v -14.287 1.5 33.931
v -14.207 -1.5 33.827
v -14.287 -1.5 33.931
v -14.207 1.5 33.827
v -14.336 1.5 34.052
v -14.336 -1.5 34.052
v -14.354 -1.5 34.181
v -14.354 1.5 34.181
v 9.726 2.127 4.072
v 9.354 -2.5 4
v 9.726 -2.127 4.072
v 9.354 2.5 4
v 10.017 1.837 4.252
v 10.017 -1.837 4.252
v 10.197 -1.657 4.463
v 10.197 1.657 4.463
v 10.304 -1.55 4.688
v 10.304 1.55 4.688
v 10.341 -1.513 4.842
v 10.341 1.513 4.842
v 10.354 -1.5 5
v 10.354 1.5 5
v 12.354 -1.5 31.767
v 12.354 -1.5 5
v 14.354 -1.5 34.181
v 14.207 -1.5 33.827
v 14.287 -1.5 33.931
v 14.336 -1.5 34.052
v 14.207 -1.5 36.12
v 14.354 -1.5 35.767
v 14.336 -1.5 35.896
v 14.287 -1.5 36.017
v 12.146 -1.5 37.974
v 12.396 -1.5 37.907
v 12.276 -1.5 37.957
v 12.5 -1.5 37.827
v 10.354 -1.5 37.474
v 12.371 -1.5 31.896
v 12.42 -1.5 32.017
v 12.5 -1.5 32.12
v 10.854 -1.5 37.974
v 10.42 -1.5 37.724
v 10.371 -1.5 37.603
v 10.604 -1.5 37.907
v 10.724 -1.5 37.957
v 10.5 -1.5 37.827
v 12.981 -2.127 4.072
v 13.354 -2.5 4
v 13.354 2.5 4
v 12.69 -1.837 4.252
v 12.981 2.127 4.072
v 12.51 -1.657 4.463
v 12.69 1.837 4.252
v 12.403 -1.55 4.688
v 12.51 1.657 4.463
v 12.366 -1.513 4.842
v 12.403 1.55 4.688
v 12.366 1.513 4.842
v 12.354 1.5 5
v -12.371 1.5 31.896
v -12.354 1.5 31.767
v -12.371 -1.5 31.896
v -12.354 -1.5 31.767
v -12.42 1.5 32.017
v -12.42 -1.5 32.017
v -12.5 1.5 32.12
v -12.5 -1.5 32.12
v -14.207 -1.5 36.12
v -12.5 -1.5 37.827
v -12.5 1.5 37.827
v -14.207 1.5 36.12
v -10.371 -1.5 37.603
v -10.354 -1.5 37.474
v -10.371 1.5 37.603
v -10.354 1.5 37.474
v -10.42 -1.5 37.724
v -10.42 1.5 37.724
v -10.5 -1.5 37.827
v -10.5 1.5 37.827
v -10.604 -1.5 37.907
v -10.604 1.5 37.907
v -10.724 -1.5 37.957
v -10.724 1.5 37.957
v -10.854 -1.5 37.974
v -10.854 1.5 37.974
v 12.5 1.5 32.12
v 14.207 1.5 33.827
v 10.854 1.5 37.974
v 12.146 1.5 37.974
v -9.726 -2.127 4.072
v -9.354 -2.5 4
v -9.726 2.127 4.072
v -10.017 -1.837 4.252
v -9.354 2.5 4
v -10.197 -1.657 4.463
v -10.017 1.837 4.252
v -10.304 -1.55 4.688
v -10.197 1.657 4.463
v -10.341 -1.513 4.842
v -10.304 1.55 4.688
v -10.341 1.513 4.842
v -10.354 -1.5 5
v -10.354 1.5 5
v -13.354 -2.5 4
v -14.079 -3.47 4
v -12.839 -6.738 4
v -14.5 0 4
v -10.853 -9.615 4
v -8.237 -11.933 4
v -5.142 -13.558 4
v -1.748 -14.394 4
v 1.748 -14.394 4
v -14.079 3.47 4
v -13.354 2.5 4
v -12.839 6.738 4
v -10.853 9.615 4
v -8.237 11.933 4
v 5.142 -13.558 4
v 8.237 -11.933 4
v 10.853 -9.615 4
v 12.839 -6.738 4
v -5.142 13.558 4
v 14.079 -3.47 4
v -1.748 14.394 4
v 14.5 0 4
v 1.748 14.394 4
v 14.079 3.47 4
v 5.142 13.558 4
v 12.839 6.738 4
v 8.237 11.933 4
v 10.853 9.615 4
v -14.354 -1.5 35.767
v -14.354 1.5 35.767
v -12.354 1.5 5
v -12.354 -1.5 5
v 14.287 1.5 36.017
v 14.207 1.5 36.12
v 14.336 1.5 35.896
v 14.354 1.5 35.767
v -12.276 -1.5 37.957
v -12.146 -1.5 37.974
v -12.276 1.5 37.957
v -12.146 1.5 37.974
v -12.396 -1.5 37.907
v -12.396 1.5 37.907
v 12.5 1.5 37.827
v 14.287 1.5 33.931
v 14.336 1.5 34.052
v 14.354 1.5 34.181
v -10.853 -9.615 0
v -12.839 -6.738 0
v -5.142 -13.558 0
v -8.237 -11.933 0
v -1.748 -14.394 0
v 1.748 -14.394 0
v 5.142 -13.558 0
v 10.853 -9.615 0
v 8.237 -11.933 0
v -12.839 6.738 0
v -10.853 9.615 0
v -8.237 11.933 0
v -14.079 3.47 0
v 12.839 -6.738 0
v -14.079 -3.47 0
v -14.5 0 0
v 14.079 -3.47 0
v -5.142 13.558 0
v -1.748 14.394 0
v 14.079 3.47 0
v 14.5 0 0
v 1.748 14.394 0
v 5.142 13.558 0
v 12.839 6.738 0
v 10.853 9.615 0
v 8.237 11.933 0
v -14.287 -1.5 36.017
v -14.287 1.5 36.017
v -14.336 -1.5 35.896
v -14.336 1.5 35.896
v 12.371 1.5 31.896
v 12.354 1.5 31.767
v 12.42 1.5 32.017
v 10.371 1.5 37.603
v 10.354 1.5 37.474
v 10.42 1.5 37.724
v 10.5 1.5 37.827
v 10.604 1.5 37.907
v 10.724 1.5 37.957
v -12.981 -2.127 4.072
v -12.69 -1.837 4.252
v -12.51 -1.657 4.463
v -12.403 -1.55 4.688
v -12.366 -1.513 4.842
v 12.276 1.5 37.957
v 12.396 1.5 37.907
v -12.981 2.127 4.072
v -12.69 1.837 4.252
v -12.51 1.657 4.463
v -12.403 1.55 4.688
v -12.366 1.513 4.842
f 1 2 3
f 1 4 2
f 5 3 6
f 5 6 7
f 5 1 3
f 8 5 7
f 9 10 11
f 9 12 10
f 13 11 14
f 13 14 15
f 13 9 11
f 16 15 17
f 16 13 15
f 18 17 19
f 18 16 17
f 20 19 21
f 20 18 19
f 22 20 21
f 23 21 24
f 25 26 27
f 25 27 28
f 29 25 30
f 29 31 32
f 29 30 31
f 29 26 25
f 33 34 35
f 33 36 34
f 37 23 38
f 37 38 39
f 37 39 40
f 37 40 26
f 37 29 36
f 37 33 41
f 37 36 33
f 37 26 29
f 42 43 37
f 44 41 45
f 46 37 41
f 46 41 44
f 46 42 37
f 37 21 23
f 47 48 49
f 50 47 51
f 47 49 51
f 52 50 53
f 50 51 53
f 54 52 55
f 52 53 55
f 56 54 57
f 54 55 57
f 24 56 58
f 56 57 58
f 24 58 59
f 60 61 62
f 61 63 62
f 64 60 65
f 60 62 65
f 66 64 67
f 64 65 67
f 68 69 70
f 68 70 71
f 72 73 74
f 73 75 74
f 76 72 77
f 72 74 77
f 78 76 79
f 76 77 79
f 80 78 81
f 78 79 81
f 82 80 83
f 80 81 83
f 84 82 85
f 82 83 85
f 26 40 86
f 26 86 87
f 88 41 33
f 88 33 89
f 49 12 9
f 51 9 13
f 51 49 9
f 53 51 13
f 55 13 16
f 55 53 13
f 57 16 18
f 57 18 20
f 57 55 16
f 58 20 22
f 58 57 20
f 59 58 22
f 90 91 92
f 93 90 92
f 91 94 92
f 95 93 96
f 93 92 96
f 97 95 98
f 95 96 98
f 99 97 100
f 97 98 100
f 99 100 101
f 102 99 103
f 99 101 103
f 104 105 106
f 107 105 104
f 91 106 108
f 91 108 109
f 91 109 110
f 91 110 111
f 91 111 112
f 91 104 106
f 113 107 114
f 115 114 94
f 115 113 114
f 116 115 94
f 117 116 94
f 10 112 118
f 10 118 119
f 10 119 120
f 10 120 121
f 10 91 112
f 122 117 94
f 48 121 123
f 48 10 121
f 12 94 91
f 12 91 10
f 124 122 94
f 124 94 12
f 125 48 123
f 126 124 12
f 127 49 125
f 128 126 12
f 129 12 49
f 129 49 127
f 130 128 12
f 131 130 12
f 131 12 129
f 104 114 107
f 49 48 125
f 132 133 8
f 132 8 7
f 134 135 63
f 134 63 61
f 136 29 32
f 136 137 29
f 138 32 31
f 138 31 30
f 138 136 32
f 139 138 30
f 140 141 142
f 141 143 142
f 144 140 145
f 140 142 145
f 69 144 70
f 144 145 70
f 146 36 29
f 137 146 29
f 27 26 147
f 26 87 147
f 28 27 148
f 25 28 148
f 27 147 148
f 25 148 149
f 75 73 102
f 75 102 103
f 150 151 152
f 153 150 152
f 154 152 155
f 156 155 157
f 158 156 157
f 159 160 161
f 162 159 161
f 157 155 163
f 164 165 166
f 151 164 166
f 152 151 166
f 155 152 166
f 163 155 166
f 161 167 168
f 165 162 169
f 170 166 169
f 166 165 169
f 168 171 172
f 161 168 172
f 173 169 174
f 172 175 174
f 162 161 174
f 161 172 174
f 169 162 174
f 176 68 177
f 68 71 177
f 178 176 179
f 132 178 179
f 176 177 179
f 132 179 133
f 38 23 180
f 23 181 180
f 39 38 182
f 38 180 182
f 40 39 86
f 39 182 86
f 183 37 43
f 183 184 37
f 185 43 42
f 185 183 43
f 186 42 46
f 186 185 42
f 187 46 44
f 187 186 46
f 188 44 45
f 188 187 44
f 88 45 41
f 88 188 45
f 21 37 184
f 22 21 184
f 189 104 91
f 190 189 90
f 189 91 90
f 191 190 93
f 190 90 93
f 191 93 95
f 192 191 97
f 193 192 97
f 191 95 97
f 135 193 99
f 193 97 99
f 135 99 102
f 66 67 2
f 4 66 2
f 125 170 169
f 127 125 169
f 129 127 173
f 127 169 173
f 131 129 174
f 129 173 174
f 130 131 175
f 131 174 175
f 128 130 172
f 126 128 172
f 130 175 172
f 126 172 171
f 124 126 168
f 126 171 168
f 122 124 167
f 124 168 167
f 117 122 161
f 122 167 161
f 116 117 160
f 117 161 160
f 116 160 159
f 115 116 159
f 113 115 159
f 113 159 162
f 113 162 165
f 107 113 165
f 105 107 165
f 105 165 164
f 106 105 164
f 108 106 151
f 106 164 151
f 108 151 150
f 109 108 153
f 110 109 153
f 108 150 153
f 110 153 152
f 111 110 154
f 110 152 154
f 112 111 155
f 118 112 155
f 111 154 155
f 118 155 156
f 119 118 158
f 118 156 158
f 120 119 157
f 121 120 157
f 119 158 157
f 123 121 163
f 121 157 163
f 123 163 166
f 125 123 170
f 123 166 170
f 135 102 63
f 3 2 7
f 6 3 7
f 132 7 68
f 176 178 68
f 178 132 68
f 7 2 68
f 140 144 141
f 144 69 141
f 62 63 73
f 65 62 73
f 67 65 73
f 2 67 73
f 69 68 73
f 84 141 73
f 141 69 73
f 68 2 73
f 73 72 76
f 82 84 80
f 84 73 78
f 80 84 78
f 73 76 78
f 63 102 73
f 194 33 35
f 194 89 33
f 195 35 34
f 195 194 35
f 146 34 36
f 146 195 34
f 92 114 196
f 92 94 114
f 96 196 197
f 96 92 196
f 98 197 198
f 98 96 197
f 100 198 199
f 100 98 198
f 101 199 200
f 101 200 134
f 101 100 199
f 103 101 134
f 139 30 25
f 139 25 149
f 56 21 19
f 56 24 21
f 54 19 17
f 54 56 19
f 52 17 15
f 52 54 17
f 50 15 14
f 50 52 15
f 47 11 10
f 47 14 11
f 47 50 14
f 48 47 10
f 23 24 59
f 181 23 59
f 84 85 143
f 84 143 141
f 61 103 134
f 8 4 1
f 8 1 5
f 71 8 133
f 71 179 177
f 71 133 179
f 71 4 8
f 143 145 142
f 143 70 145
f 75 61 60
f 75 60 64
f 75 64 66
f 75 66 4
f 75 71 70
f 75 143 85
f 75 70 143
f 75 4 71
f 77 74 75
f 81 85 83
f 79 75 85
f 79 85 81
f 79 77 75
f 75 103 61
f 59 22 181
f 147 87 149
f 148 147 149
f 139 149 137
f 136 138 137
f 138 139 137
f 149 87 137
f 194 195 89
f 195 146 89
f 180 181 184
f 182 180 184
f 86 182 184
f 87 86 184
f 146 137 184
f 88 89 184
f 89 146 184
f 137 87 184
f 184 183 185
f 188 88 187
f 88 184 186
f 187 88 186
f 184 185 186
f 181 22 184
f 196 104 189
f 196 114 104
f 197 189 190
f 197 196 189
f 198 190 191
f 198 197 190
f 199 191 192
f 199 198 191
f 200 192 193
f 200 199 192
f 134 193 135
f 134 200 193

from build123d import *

# Parameters (mm, degrees)
SKETCH1_R           = 14.5
BOSS_EXTRUDE1_DEPTH = 4
SKETCH2_W           = 2
SKETCH2_H           = 3
BOSS_EXTRUDE2_DEPTH = 33.973847717
SKETCH3_W           = 3
SKETCH3_H           = 6
BOSS_EXTRUDE3_DEPTH = 2
CUT_EXTRUDE1_REACH  = 45.684
SKETCH5_W           = 3
SKETCH5_H           = 6
BOSS_EXTRUDE4_DEPTH = 2
CUT_EXTRUDE2_REACH  = 45.684
FILLET1_R           = 1
FILLET2_R           = 0.5


with BuildPart() as part:
    # Sketch1 → Boss-Extrude1 (new body)
    with BuildSketch(Plane(origin=(0, 0, 0), x_dir=(0, 1, 0), z_dir=(0, 0, 1))):
        with Locations(Location((0, 0, 0), (0, 0, 270))):
            Circle(SKETCH1_R)
    extrude(amount=BOSS_EXTRUDE1_DEPTH)

    # Sketch2 → Boss-Extrude2 (add)
    with BuildSketch(Plane.XY.offset(4)):
        with Locations((-11.353510083, 0)):
            Rectangle(SKETCH2_W, SKETCH2_H)
        with Locations((11.353510083, 0)):
            Rectangle(SKETCH2_W, SKETCH2_H)
    extrude(amount=BOSS_EXTRUDE2_DEPTH)

    # Sketch3 → Boss-Extrude3 (add)
    with BuildSketch(Plane(origin=(-12.353510083, 0, 0), x_dir=(0, -1, 0), z_dir=(-1, 0, 0))):
        with Locations((0, 34.973847717)):
            Rectangle(SKETCH3_W, SKETCH3_H)
    extrude(amount=BOSS_EXTRUDE3_DEPTH)

    # Sketch4 → Cut-Extrude1 (cut, up to next)
    with BuildSketch(Plane.XZ.offset(1.5), mode=Mode.PRIVATE) as cut_extrude1_sk1:
        Polygon((-12.353510083, 31.973847717), (-14.353510083, 33.973847717), (-14.353510083, 31.973847717), align=None)
    cut_extrude1_tool1 = extrude(cut_extrude1_sk1.sketch, amount=-CUT_EXTRUDE1_REACH, mode=Mode.PRIVATE) & part.part
    # Sketch4 → Cut-Extrude1 (cut, up to next)
    with BuildSketch(Plane.XZ.offset(1.5), mode=Mode.PRIVATE) as cut_extrude1_sk2:
        Polygon((-12.353510083, 37.973847717), (-14.353510083, 35.973847717), (-14.353510083, 37.973847717), align=None)
    cut_extrude1_tool2 = extrude(cut_extrude1_sk2.sketch, amount=-CUT_EXTRUDE1_REACH, mode=Mode.PRIVATE) & part.part
    add(cut_extrude1_tool1.solids().sort_by_distance((-13.686843, -1.5, 32.640514))[0], mode=Mode.SUBTRACT)
    add(cut_extrude1_tool2.solids().sort_by_distance((-13.686843, -1.5, 37.307181))[0], mode=Mode.SUBTRACT)

    # Sketch5 → Boss-Extrude4 (add)
    with BuildSketch(Plane.YZ.offset(12.353510083)):
        with Locations((0, 34.973847717)):
            Rectangle(SKETCH5_W, SKETCH5_H)
    extrude(amount=BOSS_EXTRUDE4_DEPTH)

    # Sketch6 → Cut-Extrude2 (cut, up to next)
    with BuildSketch(Plane.XZ.offset(1.5), mode=Mode.PRIVATE) as cut_extrude2_sk1:
        Polygon((12.353510083, 31.973847717), (14.353510083, 33.973847717), (14.353510083, 31.973847717), align=None)
    cut_extrude2_tool1 = extrude(cut_extrude2_sk1.sketch, amount=-CUT_EXTRUDE2_REACH, mode=Mode.PRIVATE) & part.part
    # Sketch6 → Cut-Extrude2 (cut, up to next)
    with BuildSketch(Plane.XZ.offset(1.5), mode=Mode.PRIVATE) as cut_extrude2_sk2:
        Polygon((12.353510083, 37.973847717), (14.353510083, 35.973847717), (14.353510083, 37.973847717), align=None)
    cut_extrude2_tool2 = extrude(cut_extrude2_sk2.sketch, amount=-CUT_EXTRUDE2_REACH, mode=Mode.PRIVATE) & part.part
    add(cut_extrude2_tool1.solids().sort_by_distance((13.686843, -1.5, 32.640514))[0], mode=Mode.SUBTRACT)
    add(cut_extrude2_tool2.solids().sort_by_distance((13.686843, -1.5, 37.307181))[0], mode=Mode.SUBTRACT)

    # Fillet1
    fillet1_edges = [part.edges().sort_by_distance(p)[0] for p in [
        (-12.353510083, 0, 4),
        (-11.353510083, -1.5, 4),
        (12.353510083, 0, 4),
        (11.353510083, 1.5, 4),
        (10.353510083, 0, 4),
        (11.353510083, -1.5, 4),
        (-10.353510083, 0, 4),
        (-11.353510083, 1.5, 4),
    ]]
    fillet(fillet1_edges, radius=FILLET1_R)

    # Fillet2
    fillet2_edges = [part.edges().sort_by_distance(p)[0] for p in [
        (-10.353510083, 0, 37.973847717),
        (10.353510083, 0, 37.973847717),
        (-12.353510083, 0, 31.973847717),
        (-14.353510083, 0, 33.973847717),
        (-12.353510083, 0, 37.973847717),
        (-14.353510083, 0, 35.973847717),
        (12.353510083, 0, 31.973847717),
        (14.353510083, 0, 33.973847717),
        (12.353510083, 0, 37.973847717),
        (14.353510083, 0, 35.973847717),
    ]]
    fillet(fillet2_edges, radius=FILLET2_R)


solid = part.part
